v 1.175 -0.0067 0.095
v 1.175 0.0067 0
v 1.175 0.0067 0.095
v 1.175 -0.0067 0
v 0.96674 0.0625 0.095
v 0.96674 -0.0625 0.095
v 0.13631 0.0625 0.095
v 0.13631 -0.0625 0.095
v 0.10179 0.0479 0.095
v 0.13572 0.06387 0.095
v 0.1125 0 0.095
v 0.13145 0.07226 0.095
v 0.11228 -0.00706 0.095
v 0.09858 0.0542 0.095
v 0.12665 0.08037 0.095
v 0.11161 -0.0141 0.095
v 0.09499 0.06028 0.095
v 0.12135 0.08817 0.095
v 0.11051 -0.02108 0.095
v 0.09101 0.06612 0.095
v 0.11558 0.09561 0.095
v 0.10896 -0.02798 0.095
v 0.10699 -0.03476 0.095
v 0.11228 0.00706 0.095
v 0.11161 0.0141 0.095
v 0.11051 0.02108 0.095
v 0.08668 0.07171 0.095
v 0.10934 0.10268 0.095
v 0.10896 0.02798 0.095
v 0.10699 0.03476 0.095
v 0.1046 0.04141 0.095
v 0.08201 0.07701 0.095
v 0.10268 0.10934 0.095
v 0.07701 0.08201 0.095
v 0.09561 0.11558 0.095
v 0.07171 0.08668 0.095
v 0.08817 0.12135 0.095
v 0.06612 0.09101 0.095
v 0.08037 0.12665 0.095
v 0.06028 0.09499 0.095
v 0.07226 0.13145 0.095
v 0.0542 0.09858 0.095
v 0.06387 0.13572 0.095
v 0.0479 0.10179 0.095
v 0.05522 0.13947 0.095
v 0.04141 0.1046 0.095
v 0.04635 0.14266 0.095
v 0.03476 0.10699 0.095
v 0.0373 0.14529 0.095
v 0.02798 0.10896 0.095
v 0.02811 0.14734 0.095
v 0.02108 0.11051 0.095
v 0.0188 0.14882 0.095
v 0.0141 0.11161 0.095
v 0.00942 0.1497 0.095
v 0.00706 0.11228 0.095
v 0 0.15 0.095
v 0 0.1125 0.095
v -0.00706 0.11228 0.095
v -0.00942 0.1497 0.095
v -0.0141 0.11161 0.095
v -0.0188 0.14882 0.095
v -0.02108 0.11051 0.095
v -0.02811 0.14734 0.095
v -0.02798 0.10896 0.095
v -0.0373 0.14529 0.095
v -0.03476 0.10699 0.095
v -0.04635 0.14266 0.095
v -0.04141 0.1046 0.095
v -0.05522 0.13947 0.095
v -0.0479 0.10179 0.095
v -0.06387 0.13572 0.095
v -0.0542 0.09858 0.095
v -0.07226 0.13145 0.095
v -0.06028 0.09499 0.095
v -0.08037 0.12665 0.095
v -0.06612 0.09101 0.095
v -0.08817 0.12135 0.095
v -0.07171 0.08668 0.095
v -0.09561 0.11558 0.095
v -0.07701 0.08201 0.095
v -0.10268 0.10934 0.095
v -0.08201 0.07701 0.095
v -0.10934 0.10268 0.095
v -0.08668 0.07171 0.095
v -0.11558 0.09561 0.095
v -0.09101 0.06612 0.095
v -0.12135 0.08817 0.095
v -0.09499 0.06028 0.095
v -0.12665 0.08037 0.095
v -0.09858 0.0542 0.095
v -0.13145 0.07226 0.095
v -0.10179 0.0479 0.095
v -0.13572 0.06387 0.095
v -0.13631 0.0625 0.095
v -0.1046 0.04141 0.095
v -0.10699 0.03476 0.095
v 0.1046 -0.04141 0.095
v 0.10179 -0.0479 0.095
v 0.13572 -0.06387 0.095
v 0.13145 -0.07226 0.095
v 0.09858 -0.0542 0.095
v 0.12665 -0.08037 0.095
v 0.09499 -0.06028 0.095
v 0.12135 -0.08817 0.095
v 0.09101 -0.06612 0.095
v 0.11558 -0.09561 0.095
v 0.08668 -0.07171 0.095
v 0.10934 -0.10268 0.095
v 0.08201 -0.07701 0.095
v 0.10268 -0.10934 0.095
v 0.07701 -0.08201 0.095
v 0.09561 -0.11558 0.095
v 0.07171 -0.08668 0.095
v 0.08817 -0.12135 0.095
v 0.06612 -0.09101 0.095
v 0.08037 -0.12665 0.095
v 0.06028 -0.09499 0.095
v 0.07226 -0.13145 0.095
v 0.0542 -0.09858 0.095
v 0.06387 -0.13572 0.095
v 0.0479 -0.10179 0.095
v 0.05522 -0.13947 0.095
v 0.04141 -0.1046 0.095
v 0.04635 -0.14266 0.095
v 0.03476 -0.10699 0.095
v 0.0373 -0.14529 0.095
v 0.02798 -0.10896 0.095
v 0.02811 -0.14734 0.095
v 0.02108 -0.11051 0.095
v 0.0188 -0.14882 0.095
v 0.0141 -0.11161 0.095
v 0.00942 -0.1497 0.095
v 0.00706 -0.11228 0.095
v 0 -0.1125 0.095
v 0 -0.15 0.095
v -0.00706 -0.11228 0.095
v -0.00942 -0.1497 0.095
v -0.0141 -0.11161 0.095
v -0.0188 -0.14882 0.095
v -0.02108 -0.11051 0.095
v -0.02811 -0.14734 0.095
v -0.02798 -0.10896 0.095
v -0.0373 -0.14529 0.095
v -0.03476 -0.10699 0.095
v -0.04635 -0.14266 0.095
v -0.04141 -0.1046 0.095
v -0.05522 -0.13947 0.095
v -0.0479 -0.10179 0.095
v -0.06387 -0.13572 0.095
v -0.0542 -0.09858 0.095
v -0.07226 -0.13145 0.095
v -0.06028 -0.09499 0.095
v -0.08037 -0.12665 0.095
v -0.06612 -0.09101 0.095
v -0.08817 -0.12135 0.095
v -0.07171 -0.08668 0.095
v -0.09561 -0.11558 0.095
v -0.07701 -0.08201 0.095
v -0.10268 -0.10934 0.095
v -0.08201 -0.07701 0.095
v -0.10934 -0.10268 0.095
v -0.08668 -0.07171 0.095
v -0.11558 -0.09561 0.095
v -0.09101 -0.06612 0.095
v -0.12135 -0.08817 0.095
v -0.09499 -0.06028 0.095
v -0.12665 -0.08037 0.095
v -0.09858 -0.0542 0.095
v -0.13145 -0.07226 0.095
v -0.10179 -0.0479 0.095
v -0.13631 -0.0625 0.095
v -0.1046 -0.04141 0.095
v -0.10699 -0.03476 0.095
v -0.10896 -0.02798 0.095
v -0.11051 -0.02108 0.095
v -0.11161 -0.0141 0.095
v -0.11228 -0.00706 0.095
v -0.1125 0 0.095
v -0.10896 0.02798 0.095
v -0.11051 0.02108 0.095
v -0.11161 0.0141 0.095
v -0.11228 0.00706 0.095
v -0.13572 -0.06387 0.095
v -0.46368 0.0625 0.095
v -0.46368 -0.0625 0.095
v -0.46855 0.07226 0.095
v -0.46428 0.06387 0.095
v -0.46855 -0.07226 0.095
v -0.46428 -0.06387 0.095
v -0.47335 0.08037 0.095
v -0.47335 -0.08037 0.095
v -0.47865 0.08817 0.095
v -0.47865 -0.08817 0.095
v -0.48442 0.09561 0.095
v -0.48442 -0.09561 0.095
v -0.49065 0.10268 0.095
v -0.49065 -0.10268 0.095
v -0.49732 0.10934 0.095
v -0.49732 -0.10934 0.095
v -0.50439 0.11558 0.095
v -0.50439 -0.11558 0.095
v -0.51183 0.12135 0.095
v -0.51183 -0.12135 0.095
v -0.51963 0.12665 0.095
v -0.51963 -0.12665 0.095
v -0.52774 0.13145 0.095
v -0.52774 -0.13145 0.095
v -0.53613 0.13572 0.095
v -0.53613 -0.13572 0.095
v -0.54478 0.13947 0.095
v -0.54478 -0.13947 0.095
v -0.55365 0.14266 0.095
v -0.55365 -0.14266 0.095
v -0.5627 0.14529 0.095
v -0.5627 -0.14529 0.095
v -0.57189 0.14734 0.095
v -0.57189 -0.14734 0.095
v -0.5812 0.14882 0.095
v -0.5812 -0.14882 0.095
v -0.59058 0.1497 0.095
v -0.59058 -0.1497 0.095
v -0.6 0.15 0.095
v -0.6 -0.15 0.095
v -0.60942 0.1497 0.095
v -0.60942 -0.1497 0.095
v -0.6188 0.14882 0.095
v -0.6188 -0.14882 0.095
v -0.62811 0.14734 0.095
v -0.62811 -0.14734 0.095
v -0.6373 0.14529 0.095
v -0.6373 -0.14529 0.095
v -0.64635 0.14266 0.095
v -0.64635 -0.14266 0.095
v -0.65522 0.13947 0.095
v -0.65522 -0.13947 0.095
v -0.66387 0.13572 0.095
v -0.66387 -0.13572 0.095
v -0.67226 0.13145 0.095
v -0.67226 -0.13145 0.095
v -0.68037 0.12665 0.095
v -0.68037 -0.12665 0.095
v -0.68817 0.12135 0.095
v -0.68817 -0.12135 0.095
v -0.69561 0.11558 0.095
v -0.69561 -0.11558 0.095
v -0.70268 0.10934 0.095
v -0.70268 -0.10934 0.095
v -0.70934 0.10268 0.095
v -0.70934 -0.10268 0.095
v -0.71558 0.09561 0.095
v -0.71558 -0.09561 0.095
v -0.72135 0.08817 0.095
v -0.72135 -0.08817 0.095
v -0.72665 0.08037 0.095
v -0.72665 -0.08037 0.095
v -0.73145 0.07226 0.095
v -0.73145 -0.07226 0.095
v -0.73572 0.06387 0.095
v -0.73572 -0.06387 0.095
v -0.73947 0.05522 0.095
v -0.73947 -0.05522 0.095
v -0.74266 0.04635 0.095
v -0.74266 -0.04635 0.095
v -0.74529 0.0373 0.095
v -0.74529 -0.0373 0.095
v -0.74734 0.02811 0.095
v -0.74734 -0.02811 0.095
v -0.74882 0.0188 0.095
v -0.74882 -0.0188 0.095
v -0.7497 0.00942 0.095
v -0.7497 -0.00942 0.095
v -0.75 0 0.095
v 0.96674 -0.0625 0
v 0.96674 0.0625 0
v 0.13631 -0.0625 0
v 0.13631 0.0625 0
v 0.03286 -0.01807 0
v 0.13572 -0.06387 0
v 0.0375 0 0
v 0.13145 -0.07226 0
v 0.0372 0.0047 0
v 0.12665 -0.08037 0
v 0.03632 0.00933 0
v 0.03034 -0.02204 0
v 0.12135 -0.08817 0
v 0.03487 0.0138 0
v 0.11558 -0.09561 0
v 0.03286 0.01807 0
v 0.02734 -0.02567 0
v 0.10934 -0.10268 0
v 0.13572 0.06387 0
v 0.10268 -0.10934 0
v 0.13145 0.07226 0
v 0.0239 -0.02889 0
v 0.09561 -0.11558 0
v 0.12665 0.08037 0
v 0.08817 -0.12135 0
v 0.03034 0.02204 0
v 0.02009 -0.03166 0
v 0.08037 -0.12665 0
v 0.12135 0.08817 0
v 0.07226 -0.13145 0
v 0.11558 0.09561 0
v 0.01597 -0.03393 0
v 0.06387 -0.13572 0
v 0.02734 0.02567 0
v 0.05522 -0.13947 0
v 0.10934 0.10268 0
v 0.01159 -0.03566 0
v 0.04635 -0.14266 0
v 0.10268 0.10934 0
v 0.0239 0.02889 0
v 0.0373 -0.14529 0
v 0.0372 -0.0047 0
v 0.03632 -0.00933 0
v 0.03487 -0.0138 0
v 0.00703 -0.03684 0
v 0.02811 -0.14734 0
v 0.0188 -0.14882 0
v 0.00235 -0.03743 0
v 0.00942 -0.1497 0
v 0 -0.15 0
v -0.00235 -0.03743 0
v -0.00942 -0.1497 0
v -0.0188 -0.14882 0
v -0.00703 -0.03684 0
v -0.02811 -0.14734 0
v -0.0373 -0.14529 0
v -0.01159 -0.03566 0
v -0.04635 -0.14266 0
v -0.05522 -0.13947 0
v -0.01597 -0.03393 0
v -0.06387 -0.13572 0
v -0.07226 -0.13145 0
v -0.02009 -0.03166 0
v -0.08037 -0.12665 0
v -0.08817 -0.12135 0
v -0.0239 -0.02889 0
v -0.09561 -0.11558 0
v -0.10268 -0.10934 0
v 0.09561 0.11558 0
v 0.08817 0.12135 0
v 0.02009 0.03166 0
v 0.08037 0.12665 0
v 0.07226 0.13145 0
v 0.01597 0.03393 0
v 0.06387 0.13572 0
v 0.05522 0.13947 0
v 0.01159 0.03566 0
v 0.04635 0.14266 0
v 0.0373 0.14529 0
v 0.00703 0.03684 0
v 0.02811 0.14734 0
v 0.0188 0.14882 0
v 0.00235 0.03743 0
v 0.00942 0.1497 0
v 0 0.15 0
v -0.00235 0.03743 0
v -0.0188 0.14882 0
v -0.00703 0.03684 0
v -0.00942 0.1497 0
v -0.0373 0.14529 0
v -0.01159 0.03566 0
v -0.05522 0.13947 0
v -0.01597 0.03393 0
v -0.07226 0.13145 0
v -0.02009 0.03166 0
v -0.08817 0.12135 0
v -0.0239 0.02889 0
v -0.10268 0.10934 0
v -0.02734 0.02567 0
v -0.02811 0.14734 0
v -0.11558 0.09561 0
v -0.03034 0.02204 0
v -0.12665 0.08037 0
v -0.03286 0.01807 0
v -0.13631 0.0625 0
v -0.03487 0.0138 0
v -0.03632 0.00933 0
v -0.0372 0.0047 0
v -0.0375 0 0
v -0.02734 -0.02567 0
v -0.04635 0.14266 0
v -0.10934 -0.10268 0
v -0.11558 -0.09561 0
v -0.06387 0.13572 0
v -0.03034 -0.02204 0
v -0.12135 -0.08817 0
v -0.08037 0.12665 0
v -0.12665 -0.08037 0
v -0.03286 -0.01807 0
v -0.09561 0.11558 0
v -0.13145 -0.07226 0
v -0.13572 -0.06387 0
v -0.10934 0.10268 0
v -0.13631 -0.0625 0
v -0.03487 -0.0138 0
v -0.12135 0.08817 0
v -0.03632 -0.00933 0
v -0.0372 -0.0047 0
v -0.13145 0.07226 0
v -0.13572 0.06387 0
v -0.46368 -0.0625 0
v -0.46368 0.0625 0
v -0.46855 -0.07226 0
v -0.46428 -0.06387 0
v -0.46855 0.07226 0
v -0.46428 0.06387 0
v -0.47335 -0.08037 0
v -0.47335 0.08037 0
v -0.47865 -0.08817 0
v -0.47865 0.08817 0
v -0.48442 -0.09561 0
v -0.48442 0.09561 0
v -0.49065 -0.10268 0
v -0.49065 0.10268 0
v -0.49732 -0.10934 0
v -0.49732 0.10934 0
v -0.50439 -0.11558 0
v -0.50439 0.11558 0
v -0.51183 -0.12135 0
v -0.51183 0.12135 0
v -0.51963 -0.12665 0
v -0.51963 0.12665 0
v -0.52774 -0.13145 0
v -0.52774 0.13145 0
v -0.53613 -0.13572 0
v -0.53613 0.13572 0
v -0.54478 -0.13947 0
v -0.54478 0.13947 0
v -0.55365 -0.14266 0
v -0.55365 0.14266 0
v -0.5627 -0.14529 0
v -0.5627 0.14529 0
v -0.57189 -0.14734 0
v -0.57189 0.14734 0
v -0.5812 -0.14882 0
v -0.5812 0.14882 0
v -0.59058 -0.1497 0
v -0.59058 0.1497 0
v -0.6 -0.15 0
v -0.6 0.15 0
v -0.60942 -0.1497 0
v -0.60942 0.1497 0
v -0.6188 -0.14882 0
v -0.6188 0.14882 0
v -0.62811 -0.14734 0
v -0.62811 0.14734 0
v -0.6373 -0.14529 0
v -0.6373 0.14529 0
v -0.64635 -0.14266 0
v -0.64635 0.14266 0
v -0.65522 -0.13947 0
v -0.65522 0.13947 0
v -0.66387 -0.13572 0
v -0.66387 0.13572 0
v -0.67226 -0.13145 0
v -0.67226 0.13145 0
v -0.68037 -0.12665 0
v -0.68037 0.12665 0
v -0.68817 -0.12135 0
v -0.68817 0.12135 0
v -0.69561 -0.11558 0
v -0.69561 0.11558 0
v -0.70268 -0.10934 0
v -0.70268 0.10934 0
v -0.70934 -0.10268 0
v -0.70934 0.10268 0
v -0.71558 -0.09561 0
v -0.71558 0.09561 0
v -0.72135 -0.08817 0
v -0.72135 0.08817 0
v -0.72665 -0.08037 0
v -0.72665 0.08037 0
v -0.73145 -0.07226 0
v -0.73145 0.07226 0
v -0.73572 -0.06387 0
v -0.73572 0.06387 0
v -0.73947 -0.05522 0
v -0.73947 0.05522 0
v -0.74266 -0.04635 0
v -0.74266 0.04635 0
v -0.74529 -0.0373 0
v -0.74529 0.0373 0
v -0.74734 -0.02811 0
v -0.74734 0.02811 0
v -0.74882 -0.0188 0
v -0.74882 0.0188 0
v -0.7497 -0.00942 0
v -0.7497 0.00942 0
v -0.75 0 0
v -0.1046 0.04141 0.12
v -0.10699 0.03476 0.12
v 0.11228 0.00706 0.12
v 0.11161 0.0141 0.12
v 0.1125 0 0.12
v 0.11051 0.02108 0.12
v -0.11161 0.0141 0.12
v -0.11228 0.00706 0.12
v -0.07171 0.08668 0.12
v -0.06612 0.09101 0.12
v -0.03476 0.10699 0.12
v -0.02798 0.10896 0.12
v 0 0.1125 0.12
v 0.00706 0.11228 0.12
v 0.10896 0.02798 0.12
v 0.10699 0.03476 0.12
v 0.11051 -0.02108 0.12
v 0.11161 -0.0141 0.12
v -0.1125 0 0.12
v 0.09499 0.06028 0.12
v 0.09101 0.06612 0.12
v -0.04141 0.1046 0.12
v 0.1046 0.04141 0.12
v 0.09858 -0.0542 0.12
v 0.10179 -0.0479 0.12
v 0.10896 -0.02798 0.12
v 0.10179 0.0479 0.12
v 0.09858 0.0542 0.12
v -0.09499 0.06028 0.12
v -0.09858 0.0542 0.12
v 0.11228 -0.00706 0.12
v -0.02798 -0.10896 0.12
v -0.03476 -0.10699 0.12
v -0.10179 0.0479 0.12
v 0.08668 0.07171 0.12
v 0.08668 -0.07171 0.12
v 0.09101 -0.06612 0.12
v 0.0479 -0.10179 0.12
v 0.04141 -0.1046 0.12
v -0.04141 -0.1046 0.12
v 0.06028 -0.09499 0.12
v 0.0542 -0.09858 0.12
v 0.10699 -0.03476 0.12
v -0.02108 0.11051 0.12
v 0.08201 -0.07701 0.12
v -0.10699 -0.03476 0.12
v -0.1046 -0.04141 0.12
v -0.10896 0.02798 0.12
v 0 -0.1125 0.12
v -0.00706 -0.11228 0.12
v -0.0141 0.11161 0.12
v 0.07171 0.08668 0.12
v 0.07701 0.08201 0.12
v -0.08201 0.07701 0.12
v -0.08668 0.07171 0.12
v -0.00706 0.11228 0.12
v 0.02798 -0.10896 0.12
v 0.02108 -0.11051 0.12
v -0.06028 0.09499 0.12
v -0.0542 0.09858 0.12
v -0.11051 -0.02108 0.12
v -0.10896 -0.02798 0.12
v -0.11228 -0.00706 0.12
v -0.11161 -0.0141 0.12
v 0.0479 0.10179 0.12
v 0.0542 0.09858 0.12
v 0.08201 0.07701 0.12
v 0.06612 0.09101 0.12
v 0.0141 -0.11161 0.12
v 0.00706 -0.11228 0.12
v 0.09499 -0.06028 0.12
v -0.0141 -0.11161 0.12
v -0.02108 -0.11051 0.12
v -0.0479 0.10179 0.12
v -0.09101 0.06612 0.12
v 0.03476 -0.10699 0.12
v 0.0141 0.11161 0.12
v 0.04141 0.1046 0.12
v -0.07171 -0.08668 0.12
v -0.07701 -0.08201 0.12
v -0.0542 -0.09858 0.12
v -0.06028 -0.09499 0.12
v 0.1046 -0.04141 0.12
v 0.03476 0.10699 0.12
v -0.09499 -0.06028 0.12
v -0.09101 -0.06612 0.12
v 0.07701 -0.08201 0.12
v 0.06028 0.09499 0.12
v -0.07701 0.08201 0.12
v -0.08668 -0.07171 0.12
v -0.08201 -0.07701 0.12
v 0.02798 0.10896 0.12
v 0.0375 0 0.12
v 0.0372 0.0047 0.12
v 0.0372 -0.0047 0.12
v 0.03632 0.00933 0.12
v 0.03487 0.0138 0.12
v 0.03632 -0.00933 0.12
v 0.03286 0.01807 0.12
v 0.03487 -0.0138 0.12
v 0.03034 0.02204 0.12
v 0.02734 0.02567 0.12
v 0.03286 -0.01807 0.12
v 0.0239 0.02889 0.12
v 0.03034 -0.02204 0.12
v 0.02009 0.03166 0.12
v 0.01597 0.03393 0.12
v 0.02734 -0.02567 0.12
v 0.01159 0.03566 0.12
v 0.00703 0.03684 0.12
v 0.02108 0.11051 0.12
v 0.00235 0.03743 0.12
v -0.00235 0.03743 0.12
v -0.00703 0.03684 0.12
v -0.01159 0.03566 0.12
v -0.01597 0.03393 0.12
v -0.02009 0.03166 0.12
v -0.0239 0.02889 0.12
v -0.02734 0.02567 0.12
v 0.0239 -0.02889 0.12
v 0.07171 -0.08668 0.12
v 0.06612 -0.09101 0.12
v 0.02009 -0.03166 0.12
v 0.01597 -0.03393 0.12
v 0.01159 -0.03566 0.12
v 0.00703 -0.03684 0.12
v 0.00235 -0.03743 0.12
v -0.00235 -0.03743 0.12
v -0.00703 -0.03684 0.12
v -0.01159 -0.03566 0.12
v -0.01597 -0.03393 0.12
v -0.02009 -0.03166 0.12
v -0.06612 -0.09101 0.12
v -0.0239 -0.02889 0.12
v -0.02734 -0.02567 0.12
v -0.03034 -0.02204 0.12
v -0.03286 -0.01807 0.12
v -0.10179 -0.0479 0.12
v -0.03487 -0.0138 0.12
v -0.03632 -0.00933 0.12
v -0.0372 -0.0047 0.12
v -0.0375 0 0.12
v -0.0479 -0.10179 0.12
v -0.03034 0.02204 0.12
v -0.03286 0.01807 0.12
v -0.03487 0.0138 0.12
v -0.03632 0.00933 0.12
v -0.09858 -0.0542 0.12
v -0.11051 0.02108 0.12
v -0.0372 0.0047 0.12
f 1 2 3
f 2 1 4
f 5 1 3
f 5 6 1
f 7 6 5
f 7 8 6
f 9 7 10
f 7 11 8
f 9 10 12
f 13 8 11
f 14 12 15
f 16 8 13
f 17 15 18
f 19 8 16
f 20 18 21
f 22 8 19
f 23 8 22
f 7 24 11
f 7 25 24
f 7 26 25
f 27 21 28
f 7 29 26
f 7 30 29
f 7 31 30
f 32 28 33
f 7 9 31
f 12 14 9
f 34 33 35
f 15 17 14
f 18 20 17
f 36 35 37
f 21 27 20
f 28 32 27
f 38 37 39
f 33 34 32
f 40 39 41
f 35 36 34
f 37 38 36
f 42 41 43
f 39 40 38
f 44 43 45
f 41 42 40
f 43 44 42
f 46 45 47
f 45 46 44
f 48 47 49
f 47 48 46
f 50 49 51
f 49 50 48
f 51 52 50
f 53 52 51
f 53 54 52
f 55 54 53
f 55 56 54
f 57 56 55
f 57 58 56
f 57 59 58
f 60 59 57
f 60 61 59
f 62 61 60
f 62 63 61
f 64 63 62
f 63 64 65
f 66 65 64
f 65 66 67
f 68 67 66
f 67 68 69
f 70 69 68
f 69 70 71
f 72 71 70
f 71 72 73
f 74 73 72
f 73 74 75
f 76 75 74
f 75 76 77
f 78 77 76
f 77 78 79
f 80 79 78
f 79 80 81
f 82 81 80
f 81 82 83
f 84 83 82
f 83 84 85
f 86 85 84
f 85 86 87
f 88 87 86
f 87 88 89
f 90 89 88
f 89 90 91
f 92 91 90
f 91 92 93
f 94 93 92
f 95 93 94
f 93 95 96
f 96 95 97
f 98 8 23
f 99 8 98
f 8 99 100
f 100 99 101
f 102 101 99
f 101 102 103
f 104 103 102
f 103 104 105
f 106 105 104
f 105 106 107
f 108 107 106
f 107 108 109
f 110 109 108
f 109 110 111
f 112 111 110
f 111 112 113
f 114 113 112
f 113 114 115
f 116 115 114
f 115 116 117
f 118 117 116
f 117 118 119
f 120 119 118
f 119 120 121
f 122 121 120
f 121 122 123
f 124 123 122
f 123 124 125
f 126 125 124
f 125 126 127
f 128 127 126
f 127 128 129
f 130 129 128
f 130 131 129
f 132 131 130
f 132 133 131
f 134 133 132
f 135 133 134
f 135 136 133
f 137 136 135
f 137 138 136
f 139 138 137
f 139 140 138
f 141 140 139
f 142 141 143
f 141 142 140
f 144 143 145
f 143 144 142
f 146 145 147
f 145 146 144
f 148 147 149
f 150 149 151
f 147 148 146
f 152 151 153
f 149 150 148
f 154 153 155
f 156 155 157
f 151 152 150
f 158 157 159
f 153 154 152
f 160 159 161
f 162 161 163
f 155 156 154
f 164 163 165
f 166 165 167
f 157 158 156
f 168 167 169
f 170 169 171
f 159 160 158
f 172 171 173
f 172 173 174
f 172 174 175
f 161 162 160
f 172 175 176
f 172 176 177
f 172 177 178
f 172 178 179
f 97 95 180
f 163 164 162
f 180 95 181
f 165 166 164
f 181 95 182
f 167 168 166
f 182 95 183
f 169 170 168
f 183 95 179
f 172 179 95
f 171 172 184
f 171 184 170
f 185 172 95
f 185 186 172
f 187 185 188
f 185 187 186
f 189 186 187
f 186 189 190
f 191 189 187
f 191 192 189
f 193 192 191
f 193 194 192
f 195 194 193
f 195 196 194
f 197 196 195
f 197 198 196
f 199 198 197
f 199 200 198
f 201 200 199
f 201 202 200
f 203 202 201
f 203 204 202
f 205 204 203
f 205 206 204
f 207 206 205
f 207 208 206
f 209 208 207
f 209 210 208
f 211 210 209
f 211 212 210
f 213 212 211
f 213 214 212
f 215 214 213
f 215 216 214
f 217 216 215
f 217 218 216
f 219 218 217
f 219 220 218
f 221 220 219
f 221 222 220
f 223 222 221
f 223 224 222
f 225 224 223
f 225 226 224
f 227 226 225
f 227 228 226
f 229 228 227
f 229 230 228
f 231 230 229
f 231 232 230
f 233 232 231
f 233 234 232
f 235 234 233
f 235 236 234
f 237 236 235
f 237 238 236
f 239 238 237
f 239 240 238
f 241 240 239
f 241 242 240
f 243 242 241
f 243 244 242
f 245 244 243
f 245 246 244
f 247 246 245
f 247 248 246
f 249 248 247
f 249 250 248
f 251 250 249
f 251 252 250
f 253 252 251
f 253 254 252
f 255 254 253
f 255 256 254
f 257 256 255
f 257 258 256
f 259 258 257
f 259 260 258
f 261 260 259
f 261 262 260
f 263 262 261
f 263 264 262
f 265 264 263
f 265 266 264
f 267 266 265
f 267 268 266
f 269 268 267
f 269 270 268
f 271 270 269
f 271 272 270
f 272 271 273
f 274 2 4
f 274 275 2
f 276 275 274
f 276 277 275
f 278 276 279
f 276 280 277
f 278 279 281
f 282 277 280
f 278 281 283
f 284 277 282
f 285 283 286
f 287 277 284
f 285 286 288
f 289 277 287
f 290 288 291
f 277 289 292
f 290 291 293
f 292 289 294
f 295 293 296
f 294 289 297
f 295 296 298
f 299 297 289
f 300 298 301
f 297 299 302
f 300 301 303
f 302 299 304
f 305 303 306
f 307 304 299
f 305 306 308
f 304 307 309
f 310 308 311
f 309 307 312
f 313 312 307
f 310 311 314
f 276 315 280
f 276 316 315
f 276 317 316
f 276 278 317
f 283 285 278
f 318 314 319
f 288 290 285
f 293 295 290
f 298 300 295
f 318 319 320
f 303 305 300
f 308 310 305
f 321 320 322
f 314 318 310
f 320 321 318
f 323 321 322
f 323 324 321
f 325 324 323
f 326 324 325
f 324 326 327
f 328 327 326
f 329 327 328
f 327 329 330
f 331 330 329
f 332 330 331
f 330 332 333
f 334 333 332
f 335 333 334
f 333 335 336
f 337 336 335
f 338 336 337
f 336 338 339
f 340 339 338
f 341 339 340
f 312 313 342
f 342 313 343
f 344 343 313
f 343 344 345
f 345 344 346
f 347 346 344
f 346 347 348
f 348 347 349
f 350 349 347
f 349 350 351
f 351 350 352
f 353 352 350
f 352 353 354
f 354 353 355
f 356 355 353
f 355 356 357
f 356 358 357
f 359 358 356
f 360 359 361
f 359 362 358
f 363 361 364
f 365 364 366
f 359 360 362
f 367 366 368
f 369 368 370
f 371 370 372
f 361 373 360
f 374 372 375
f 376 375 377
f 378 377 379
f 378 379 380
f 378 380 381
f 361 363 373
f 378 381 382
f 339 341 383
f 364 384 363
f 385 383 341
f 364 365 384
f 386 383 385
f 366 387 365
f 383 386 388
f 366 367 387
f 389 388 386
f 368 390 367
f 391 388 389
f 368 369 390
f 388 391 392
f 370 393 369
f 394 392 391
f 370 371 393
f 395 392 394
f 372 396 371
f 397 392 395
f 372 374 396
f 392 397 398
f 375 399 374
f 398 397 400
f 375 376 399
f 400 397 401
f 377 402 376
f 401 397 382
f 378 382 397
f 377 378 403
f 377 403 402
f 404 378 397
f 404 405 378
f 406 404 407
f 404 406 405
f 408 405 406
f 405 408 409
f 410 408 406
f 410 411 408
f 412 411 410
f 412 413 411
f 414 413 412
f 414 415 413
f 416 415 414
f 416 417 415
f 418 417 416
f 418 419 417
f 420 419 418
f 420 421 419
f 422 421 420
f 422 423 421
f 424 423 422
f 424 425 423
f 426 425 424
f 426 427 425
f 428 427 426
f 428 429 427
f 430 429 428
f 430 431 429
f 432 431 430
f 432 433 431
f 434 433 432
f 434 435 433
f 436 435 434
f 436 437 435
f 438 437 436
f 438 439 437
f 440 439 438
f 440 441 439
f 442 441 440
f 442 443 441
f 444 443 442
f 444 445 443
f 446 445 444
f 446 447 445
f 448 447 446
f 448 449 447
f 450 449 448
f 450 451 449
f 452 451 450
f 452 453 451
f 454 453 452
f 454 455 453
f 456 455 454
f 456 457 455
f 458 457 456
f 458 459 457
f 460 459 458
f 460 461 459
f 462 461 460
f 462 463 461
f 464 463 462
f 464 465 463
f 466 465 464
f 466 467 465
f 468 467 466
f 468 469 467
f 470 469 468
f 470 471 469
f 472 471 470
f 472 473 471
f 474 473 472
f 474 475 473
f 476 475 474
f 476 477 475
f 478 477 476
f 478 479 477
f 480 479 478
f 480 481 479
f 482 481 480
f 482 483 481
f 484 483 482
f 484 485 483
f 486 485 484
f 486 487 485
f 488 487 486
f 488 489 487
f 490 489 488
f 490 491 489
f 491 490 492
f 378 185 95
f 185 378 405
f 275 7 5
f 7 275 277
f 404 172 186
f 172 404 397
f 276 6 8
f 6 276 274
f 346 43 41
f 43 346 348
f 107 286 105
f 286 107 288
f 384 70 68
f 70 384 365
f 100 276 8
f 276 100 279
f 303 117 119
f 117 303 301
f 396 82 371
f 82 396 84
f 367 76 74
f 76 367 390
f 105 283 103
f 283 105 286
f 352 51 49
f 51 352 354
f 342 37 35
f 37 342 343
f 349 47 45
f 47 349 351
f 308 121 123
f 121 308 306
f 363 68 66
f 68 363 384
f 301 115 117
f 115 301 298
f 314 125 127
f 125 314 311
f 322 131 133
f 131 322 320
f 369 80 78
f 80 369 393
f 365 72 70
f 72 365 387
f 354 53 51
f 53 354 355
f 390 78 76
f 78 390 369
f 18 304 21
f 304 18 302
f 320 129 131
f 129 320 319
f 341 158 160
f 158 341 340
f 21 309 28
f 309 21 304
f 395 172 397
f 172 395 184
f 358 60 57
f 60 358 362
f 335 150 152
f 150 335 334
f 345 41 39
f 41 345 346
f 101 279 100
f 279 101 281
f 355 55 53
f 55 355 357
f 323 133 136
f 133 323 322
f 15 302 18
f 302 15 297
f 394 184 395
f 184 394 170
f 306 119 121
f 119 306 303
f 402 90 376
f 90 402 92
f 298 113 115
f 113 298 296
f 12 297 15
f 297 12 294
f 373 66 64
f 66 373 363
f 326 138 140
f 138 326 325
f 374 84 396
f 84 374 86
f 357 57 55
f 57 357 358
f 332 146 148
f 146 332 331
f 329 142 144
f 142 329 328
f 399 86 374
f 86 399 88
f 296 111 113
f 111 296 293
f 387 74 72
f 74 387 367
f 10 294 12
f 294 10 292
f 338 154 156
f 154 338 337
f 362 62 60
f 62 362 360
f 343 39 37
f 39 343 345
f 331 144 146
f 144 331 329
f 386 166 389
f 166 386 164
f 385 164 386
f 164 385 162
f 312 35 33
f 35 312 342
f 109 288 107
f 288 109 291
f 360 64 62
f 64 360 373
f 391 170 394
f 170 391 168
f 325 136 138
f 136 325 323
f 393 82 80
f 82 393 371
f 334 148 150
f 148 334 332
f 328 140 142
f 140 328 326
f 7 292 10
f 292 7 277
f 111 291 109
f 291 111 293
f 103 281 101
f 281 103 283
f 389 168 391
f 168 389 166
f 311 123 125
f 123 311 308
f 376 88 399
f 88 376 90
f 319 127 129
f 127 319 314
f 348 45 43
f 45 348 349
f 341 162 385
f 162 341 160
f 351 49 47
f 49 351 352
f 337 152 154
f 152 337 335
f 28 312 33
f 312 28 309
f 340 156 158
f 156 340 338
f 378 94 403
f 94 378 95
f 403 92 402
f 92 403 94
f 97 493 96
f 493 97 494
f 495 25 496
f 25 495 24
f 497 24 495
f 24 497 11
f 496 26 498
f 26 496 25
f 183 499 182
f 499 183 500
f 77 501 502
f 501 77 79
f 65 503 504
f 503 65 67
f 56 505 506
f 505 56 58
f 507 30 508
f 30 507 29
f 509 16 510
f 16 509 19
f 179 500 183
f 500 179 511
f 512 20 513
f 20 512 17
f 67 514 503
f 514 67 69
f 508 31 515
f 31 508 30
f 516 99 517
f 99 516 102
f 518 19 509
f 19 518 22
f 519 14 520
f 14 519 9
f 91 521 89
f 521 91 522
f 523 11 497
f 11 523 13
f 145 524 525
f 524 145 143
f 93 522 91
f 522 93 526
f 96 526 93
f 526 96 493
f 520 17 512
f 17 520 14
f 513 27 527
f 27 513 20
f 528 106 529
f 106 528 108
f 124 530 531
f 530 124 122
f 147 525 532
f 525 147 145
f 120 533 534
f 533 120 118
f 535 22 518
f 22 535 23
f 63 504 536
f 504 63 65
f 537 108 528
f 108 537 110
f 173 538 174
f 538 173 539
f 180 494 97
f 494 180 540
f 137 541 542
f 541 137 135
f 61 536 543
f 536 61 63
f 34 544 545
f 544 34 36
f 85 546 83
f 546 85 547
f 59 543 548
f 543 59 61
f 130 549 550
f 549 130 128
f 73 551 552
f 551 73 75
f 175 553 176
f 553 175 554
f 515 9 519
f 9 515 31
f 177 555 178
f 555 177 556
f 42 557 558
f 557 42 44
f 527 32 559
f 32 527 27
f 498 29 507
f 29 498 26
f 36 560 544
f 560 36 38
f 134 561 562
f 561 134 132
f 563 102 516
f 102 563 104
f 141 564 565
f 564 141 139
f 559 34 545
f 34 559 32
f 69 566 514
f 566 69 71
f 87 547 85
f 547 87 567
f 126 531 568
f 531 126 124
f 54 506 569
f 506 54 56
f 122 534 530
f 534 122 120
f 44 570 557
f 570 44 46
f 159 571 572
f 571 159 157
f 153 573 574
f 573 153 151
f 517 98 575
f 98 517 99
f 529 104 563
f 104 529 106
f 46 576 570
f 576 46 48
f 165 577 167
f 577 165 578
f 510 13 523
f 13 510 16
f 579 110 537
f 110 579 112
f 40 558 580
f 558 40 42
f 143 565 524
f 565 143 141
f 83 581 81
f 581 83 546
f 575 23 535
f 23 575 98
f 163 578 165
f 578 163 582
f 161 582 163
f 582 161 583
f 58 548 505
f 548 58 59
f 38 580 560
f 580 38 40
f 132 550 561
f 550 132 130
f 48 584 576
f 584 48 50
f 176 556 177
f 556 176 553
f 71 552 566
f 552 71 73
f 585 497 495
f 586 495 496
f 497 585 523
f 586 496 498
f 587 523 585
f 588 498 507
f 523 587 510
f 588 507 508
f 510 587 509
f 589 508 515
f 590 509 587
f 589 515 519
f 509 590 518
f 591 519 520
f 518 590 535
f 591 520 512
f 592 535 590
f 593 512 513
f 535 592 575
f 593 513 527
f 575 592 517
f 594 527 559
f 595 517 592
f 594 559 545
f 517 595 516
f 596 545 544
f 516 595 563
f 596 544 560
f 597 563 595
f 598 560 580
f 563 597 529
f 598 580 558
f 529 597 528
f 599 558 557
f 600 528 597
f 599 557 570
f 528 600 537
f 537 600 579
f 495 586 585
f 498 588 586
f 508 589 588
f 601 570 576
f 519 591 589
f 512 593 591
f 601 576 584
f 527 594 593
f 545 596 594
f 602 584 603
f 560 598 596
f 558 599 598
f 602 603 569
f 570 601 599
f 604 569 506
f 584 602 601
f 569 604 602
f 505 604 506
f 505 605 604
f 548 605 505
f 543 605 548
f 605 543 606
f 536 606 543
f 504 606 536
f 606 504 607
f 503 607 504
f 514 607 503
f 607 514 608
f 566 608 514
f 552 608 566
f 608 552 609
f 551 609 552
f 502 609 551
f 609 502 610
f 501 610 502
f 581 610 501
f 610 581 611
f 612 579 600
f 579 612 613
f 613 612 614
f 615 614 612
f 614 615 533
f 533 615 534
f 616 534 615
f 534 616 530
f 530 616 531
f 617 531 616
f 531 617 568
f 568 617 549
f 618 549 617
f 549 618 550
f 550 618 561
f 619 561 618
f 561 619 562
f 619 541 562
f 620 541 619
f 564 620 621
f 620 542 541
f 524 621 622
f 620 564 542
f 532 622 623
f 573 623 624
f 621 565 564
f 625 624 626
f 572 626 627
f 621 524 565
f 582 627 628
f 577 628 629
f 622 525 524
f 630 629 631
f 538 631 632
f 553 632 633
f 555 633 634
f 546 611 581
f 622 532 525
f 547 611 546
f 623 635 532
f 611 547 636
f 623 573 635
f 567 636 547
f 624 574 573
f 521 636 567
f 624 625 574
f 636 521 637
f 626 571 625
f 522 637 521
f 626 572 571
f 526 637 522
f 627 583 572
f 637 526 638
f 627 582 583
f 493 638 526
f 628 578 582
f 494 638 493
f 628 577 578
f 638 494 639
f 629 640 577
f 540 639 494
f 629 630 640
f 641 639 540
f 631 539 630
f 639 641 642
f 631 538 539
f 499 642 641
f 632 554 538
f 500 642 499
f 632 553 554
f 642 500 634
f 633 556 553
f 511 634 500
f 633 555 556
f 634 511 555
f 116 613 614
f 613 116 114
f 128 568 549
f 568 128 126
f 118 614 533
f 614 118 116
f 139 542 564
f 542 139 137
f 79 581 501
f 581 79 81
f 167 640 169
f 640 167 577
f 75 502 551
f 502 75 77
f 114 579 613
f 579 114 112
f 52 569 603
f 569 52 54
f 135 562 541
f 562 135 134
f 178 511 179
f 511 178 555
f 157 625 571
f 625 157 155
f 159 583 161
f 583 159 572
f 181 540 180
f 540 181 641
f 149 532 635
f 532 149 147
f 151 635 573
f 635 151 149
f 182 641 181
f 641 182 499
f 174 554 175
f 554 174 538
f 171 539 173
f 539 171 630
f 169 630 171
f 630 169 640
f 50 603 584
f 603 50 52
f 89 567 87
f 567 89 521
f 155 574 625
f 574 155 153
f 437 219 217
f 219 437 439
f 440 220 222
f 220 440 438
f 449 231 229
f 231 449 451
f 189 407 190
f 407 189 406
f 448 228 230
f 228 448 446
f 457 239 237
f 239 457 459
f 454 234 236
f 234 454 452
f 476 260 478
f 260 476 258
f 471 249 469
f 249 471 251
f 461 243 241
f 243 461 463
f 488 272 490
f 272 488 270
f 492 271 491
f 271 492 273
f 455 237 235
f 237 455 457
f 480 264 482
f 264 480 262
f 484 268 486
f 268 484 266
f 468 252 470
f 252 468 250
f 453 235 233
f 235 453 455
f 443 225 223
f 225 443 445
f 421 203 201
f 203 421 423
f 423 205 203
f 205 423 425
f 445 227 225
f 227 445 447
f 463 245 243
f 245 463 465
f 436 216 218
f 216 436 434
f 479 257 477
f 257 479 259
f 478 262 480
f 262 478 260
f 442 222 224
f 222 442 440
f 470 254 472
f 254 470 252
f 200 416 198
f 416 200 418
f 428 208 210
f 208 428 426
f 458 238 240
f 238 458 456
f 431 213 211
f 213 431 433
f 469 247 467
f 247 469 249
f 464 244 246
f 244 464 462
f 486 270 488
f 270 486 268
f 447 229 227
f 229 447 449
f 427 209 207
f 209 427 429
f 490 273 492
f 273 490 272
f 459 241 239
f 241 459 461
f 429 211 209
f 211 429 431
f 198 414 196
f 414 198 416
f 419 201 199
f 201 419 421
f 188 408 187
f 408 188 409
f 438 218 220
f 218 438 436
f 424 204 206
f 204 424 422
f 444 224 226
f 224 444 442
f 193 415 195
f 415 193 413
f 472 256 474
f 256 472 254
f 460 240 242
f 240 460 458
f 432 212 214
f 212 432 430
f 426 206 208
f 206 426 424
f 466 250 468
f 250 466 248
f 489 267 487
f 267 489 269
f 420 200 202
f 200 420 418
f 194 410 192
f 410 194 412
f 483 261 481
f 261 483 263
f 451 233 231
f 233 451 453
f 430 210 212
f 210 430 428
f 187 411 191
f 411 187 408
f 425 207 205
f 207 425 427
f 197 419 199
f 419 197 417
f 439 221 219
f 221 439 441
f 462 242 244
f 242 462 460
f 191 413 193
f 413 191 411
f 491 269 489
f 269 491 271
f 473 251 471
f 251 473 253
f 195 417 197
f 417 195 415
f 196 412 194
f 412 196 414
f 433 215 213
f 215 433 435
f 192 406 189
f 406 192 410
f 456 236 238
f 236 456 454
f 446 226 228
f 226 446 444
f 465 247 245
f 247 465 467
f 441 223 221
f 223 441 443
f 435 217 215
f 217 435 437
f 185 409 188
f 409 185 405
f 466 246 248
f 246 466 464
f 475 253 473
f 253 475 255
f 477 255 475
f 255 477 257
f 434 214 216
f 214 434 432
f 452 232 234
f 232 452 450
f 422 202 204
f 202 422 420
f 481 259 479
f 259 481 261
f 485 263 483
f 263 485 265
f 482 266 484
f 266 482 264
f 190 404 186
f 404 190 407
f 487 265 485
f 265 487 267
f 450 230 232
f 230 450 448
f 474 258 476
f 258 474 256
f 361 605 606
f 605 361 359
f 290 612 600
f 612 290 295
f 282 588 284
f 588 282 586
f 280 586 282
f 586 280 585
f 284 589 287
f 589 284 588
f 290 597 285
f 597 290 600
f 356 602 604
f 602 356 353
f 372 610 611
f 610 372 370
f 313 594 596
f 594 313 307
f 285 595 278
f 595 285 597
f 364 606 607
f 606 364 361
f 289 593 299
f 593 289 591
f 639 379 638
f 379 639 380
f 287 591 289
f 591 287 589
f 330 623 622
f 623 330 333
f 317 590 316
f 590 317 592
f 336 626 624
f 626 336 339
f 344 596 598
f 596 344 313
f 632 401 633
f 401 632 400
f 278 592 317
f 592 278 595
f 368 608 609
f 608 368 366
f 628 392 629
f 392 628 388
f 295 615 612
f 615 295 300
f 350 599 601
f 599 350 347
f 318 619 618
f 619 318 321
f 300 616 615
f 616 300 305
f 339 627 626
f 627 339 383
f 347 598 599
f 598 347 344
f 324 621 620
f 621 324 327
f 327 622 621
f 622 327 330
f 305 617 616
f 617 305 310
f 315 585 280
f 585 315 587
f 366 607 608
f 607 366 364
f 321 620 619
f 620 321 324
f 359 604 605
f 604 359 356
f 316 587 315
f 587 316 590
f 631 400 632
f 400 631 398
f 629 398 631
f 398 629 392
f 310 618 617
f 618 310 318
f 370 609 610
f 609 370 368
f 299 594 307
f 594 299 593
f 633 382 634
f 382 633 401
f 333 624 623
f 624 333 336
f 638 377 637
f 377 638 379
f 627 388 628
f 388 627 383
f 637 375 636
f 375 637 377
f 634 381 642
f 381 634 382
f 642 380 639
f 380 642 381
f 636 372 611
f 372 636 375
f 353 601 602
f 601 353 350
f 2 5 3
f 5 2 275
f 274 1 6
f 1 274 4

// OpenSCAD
indicatorFrontLength = 1.175;
indicatorBackLength = 0.600;
indicatorWidth = 0.125;
indicatorHeight = 0.095;
indicatorCenterHubDiameter = 0.300;
indicatorMountingHubDiameter = 0.225;

difference() {
  union() {
    translate([-indicatorBackLength, -indicatorWidth/2, 0])
      cube([indicatorFrontLength + indicatorBackLength, indicatorWidth, indicatorHeight], center = false);

    cylinder(h = indicatorHeight, d = indicatorCenterHubDiameter, center = false, $fn = 100);
    cylinder(h = indicatorHeight + 0.025, d = indicatorMountingHubDiameter, center = false, $fn = 100);

    translate([-indicatorBackLength, 0, 0])
      cylinder(h = indicatorHeight, d = indicatorCenterHubDiameter, center = false, $fn = 100);
  }

  cylinder(h = 0.500, d = 0.075, center = true, $fn = 50);

  translate([1.825 - 0.525 - .1, 0, 0])
    rotate(a=75, v=[0,0,1])
      translate([0.5, 0, 0])
        cube([1, 1, 1], center = true);

  translate([1.825 - 0.525 - .1, 0, 0])
    rotate(a=-75, v=[0,0,1])
      translate([0.5, 0, 0])
        cube([1, 1, 1], center = true);

}
